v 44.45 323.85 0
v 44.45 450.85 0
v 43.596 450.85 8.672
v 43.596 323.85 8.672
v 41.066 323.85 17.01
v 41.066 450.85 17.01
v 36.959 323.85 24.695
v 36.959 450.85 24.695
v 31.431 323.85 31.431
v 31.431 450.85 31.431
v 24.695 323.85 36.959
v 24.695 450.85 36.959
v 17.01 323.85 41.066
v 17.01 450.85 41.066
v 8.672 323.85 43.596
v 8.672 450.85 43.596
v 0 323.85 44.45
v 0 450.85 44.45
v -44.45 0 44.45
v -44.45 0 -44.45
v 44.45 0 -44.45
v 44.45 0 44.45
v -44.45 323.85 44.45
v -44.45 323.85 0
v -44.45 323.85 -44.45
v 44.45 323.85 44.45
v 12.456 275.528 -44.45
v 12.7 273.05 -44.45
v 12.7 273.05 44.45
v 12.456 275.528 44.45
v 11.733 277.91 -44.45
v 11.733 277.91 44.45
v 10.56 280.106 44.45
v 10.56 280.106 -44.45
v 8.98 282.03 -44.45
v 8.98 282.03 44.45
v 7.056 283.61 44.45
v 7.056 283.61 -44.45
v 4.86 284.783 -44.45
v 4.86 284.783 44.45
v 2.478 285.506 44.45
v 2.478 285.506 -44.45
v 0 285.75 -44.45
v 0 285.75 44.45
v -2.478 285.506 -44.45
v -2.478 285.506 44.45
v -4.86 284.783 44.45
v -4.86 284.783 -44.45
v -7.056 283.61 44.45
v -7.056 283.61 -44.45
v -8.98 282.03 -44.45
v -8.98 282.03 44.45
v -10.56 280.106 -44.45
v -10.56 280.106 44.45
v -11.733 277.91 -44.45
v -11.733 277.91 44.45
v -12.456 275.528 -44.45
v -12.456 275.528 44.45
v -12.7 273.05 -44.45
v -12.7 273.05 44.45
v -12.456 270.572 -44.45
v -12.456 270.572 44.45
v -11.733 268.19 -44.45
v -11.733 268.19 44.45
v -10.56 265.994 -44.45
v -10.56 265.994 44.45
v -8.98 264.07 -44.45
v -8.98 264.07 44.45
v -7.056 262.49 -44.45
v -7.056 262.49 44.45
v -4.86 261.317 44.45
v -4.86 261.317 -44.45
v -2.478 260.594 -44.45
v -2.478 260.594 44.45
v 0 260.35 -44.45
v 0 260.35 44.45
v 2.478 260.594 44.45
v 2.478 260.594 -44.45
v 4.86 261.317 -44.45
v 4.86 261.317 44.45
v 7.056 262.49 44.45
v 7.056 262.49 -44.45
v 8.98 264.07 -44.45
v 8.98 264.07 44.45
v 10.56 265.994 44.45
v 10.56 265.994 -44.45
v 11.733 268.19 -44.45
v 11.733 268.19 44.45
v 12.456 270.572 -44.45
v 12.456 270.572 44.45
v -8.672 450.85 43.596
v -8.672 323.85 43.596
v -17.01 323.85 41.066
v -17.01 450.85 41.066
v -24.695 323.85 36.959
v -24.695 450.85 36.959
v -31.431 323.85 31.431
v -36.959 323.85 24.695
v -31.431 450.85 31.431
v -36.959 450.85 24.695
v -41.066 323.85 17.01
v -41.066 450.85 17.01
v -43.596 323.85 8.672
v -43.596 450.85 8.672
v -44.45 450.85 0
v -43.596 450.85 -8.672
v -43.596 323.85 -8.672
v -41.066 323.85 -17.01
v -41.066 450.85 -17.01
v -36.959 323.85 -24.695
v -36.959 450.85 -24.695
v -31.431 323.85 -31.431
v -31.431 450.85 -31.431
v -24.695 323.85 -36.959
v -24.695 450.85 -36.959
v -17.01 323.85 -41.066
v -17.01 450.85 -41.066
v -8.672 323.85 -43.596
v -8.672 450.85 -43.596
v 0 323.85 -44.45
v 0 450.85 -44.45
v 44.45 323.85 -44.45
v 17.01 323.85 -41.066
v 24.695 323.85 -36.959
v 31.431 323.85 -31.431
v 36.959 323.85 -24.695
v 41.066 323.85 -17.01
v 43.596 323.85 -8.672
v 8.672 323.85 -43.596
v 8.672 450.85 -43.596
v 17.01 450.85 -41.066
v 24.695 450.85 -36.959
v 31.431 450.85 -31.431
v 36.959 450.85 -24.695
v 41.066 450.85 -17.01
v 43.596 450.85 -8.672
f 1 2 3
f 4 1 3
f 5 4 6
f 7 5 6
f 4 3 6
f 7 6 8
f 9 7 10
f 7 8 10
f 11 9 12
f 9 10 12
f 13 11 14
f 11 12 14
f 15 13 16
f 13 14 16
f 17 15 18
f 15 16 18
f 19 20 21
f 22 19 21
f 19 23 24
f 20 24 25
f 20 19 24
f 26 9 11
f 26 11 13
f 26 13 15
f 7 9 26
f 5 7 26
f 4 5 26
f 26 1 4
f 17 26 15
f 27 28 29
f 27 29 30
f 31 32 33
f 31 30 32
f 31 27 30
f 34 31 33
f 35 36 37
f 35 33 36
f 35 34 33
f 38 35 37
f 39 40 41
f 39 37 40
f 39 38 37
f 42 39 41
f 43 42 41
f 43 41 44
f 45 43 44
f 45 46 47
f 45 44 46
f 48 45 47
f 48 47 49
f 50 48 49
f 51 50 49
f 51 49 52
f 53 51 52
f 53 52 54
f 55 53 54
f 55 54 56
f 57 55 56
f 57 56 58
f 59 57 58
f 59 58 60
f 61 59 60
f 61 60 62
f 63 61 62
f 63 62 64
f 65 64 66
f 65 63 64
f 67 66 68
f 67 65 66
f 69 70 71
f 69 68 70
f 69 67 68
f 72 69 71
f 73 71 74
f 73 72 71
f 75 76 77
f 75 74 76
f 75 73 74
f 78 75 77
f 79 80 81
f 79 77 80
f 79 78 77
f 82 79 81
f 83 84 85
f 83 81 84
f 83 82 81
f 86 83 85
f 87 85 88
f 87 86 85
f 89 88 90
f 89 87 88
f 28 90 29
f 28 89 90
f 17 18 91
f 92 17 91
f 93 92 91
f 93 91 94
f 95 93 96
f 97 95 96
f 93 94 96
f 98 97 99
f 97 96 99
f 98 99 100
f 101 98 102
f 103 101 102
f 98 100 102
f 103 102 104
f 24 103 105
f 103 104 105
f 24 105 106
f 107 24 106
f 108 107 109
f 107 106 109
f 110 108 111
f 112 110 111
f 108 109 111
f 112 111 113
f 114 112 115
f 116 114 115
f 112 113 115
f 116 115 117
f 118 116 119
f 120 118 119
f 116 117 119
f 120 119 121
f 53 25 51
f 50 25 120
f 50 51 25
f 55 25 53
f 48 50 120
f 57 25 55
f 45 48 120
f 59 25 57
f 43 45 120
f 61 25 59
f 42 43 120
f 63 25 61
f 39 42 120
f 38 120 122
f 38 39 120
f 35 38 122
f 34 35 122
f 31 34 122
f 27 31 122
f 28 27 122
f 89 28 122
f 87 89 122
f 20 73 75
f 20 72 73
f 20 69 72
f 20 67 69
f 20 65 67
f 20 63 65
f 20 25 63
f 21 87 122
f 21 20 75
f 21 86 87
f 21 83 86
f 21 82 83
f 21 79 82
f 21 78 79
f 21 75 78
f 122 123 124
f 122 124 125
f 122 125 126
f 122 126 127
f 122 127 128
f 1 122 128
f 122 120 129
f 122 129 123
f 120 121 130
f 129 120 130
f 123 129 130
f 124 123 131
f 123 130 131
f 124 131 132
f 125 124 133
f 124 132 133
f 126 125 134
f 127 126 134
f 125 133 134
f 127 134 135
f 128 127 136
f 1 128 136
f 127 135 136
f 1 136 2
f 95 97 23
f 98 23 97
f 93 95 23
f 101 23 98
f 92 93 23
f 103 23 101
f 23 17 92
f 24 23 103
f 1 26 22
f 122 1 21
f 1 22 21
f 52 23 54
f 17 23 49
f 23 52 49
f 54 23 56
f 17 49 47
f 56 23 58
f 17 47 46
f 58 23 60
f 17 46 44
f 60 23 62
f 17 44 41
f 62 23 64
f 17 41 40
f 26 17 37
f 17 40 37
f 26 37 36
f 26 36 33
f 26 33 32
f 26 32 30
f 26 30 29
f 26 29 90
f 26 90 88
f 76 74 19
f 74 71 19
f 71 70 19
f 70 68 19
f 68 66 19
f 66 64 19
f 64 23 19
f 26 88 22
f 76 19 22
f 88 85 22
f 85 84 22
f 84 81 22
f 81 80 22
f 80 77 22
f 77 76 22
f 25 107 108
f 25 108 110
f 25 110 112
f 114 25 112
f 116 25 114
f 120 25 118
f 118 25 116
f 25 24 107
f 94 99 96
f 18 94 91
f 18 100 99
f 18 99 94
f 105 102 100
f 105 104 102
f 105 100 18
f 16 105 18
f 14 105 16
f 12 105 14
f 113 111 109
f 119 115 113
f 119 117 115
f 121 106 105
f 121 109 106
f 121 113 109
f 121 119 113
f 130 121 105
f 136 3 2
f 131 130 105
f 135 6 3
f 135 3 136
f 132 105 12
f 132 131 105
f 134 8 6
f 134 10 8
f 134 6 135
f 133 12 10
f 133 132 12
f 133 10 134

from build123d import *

# Parameters (mm, degrees)
SKETCH1_W               = 88.9
SKETCH1_H               = 88.9
BOSS_EXTRUDE1_DEPTH     = 450.85
CUT_EXTRUDE1_DEPTH      = 127
CUT_EXTRUDE2_DEPTH      = 456.211299838
CUT_EXTRUDE2_DEPTH_BACK = 456.211299838
SKETCH3_R               = 12.7


with BuildPart() as part:
    # Sketch1 → Boss-Extrude1 (new body)
    with BuildSketch(Plane(origin=(0, 0, 0), x_dir=(1, 0, 0), z_dir=(0, 1, 0))):
        Rectangle(SKETCH1_W, SKETCH1_H)
    extrude(amount=BOSS_EXTRUDE1_DEPTH)

    # Sketch2 → Cut-Extrude1 (cut)
    with BuildSketch(Plane(origin=(0, 450.85, 0), x_dir=(1, 0, 0), z_dir=(0, 1, 0))):
        with BuildLine():
            Line((-44.45, -44.45), (-1.97e-07, -44.45))
            ThreePointArc((-1.97e-07, -44.45), (-31.430896472, -31.430896376), (-44.45, -6.1e-08))
            Line((-44.45, -6.1e-08), (-44.45, -44.45))
        make_face()
        with BuildLine():
            ThreePointArc((-44.45, -6.1e-08), (-31.430896452, 31.430896396), (-1.8e-08, 44.45))
            Line((-1.8e-08, 44.45), (-44.45, 44.45))
            Line((-44.45, 44.45), (-44.45, -6.1e-08))
        make_face()
        with BuildLine():
            ThreePointArc((-1.8e-08, 44.45), (31.430896417, 31.43089643), (44.45, 0))
            Line((44.45, 0), (44.45, 44.45))
            Line((44.45, 44.45), (-1.8e-08, 44.45))
        make_face()
        with BuildLine():
            Line((44.45, -44.45), (44.45, 0))
            ThreePointArc((44.45, 0), (31.430896354, -31.430896493), (-1.97e-07, -44.45))
            Line((-1.97e-07, -44.45), (44.45, -44.45))
        make_face()
    extrude(amount=-CUT_EXTRUDE1_DEPTH, mode=Mode.SUBTRACT)

    # Sketch3 → Cut-Extrude2 (cut, two sides: drawn at the far end of the back side and taken through both)
    with BuildSketch(Plane.XY.offset(-CUT_EXTRUDE2_DEPTH_BACK)):
        with Locations((0, 273.05)):
            Circle(SKETCH3_R)
    extrude(amount=CUT_EXTRUDE2_DEPTH + CUT_EXTRUDE2_DEPTH_BACK, mode=Mode.SUBTRACT)


solid = part.part
